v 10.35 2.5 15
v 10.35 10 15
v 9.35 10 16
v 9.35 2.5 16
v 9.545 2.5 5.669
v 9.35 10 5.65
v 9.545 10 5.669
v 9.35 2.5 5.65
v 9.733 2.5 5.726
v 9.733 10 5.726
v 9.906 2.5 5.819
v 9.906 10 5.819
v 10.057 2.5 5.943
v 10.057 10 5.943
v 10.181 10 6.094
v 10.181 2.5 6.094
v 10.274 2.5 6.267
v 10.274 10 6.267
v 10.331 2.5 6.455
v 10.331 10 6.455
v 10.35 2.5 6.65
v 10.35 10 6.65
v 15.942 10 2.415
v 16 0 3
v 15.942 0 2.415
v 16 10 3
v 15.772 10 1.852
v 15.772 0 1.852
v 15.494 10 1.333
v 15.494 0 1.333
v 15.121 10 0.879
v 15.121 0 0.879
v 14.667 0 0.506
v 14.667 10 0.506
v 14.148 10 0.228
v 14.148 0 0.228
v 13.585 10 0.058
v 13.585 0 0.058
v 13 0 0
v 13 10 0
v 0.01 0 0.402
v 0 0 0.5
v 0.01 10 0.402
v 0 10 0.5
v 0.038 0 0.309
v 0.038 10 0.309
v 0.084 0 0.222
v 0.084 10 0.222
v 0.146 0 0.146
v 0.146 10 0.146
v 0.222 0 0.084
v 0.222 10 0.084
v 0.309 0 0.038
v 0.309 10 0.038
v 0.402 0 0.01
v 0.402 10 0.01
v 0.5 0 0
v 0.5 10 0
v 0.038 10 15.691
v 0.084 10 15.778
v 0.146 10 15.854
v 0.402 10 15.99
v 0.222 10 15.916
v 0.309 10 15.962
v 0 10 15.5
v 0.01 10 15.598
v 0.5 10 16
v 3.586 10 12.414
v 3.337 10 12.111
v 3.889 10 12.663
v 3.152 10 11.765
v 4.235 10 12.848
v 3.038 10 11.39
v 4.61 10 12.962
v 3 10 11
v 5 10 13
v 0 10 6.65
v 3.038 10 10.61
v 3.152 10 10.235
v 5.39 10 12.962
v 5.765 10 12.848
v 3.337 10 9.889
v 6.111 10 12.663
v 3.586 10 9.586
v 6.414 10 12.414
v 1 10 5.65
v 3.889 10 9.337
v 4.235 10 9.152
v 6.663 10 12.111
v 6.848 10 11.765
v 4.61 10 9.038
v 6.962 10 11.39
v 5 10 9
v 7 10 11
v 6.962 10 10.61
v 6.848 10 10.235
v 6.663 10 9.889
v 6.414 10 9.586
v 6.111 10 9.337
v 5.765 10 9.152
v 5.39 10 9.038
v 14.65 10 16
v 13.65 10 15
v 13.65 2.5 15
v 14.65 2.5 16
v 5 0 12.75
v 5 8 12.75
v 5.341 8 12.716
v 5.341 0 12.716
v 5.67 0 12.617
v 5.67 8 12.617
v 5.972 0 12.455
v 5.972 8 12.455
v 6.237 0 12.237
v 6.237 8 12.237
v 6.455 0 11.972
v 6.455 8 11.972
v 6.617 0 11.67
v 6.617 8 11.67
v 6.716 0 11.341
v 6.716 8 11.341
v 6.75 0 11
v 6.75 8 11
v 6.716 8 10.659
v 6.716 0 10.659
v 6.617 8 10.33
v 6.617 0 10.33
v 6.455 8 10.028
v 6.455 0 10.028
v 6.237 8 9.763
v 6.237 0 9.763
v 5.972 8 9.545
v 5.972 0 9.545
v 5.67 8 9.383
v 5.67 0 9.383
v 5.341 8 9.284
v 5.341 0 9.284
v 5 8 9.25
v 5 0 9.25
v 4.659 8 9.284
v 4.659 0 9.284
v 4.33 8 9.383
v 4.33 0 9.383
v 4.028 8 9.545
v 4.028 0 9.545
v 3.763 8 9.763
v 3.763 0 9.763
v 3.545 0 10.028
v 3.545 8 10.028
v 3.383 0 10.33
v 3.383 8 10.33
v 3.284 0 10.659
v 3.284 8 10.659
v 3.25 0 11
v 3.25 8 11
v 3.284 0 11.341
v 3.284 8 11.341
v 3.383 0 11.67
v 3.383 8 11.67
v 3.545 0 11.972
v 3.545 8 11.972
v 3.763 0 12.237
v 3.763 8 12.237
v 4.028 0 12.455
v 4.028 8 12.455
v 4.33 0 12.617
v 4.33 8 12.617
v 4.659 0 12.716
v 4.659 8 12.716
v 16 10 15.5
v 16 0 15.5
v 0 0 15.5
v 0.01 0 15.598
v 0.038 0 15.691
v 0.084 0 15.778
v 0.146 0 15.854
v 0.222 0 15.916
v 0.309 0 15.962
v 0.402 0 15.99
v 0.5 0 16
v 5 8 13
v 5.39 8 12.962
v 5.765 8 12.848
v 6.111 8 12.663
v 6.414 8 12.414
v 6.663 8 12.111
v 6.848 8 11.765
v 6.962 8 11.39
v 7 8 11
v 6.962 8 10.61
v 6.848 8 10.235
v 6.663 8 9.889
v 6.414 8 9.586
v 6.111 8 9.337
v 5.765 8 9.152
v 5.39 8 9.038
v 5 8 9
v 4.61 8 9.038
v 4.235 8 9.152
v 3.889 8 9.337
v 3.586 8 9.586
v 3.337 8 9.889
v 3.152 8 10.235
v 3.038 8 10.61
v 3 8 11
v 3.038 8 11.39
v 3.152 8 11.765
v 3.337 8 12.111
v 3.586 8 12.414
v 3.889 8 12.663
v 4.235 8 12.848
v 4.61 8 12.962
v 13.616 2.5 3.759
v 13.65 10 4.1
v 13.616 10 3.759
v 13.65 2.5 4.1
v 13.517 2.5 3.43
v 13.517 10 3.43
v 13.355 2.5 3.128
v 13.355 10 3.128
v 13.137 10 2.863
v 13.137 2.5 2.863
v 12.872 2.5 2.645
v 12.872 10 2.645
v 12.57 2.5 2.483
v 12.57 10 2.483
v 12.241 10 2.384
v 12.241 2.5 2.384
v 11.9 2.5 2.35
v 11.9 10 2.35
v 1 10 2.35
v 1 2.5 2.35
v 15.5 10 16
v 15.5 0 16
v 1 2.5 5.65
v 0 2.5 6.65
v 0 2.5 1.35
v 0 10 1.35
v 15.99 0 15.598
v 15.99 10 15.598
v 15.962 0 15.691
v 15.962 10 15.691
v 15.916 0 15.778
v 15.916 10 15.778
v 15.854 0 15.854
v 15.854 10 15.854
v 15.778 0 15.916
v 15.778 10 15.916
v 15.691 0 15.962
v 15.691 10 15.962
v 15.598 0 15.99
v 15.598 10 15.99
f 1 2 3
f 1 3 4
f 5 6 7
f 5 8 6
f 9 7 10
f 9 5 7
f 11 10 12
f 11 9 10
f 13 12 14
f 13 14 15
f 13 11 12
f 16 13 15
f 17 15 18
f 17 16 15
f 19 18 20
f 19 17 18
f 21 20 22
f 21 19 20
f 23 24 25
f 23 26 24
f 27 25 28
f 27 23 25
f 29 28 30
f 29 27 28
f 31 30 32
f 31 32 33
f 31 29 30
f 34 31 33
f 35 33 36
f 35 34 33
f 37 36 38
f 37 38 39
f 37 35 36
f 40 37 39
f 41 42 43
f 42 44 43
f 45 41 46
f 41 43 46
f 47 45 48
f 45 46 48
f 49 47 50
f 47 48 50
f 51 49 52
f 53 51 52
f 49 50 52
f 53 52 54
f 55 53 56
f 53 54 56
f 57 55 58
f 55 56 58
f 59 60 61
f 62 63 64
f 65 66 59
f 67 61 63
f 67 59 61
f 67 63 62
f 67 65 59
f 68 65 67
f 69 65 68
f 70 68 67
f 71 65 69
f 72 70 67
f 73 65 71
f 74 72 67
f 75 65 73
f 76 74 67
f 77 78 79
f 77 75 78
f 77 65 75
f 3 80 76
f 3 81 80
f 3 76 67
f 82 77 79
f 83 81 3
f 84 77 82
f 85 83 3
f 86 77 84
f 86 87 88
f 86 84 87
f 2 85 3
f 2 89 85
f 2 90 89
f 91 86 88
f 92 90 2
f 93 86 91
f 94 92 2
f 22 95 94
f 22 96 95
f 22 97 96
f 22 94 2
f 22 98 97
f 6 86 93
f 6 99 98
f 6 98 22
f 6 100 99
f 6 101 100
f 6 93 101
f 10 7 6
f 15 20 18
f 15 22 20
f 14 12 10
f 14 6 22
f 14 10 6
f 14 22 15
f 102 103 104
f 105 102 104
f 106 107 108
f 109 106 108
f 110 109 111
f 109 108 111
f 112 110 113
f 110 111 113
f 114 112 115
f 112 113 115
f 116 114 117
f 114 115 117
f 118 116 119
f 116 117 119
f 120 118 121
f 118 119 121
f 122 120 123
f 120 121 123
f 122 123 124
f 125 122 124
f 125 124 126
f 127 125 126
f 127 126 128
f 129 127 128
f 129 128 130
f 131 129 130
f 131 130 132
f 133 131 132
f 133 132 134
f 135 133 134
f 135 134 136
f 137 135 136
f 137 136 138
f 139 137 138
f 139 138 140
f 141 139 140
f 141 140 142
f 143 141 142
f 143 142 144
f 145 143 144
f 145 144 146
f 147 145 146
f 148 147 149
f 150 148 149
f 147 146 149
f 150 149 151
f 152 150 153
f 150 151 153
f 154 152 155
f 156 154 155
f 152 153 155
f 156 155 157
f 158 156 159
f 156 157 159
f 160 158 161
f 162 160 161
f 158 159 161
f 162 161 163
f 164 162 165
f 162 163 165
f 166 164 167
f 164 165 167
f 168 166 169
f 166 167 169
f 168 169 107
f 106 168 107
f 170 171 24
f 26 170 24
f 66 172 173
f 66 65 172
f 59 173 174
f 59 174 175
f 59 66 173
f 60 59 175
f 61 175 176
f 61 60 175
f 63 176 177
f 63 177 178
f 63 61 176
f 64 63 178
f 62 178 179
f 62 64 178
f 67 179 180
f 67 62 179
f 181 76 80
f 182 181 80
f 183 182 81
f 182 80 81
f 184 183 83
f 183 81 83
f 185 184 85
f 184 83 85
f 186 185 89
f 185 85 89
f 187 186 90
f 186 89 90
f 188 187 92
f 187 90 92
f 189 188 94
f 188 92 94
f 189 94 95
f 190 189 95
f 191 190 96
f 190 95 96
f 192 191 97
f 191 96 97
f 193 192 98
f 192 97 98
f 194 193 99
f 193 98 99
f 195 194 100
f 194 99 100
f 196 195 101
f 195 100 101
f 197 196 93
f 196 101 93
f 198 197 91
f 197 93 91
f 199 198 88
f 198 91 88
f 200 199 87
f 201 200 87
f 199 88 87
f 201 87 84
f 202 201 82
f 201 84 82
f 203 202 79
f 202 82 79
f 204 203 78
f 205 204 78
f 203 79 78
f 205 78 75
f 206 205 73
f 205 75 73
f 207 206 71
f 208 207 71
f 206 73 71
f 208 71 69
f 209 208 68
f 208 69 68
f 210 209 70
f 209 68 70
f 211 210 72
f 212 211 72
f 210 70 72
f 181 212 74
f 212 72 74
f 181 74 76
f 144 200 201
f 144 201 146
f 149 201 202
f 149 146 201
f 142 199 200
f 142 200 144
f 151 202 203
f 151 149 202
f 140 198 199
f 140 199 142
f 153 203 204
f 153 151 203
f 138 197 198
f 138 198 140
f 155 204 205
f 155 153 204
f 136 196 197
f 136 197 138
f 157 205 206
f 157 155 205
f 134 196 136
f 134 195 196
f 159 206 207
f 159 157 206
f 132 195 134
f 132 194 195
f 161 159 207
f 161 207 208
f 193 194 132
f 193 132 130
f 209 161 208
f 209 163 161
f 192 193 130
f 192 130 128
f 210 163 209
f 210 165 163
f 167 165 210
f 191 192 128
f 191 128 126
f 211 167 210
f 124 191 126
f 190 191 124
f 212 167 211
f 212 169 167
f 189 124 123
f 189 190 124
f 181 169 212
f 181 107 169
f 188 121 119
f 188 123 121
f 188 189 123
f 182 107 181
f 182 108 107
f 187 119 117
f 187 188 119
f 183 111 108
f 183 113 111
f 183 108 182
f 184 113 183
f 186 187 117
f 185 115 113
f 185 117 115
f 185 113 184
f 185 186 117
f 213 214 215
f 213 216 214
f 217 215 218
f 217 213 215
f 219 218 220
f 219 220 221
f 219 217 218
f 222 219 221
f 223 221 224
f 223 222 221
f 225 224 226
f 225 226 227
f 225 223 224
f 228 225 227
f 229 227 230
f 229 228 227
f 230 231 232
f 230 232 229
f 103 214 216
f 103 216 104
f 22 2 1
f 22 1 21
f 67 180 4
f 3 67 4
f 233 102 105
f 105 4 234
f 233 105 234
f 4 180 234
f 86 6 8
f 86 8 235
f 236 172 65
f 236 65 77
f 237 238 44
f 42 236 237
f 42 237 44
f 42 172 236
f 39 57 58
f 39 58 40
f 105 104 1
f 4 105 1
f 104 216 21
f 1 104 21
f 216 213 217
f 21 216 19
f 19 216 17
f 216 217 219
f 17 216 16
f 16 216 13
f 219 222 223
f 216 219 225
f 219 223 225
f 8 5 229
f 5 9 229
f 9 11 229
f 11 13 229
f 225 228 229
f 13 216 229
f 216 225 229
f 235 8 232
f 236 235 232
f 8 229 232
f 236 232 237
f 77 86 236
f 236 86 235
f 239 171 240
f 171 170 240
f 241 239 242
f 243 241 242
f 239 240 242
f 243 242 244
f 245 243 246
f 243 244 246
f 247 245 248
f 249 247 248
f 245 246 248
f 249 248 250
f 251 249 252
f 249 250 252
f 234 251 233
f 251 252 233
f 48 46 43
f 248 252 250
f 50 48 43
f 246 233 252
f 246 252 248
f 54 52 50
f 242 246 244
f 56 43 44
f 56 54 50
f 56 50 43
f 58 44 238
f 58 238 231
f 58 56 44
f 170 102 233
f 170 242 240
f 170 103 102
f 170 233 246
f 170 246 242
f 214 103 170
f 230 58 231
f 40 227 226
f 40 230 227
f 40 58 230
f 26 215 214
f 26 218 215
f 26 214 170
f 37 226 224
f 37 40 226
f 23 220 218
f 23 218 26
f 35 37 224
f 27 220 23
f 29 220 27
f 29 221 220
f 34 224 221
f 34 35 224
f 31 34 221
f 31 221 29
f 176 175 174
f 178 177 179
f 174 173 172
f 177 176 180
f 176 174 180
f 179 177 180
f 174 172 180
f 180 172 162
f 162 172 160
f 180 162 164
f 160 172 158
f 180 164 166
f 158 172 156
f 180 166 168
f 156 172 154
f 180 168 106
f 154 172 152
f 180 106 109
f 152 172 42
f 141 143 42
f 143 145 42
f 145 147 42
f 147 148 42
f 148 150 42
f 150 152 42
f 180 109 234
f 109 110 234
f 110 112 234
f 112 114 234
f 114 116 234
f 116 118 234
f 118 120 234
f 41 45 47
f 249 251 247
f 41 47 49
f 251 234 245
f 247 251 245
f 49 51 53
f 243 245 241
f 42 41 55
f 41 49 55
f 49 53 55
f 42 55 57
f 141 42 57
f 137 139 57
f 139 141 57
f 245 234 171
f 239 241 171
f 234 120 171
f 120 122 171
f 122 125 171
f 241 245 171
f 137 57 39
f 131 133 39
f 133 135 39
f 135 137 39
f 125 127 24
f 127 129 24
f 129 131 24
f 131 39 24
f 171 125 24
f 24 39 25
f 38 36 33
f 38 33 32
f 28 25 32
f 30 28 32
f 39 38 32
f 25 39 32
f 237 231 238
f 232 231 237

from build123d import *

# Parameters (mm, degrees)
SKETCH1_W           = 16
SKETCH1_H           = 16
BOSS_EXTRUDE1_DEPTH = 10
SKETCH4_R           = 1.75
CUT_EXTRUDE3_DEPTH  = 10
CUT_EXTRUDE4_DEPTH  = 7.5
FILLET1_R           = 1
FILLET2_R           = 1.75
FILLET5_R           = 3
CHAMFER1_SIZE       = 1
FILLET6_R           = 0.5
SKETCH6_R           = 2
CUT_EXTRUDE5_DEPTH  = 2


with BuildPart() as part:
    # Sketch1 → Boss-Extrude1 (new body)
    with BuildSketch(Plane(origin=(0, 0, 0), x_dir=(1, 0, 0), z_dir=(0, 1, 0))):
        with Locations((8, -8)):
            Rectangle(SKETCH1_W, SKETCH1_H)
    extrude(amount=BOSS_EXTRUDE1_DEPTH)

    # Sketch4 → Cut-Extrude3 (cut)
    with BuildSketch(Plane(origin=(0, 10, 0), x_dir=(1, 0, 0), z_dir=(0, 1, 0))):
        with Locations(Location((5, -11, 0), (0, 0, 270))):
            Circle(SKETCH4_R)
    extrude(amount=-CUT_EXTRUDE3_DEPTH, mode=Mode.SUBTRACT)

    # Sketch5 → Cut-Extrude4 (cut)
    with BuildSketch(Plane(origin=(0, 10, 0), x_dir=(1, 0, 0), z_dir=(0, 1, 0))):
        Polygon((0, -2.35), (13.65, -2.35), (13.65, -16), (10.35, -16), (10.35, -5.65), (0, -5.65), align=None)
    extrude(amount=-CUT_EXTRUDE4_DEPTH, mode=Mode.SUBTRACT)

    # Fillet1
    fillet1_edges = [part.edges().sort_by_distance(p)[0] for p in [
        (10.35, 6.25, 5.65),
    ]]
    fillet(fillet1_edges, radius=FILLET1_R)

    # Fillet2
    fillet2_edges = [part.edges().sort_by_distance(p)[0] for p in [
        (13.65, 6.25, 2.35),
    ]]
    fillet(fillet2_edges, radius=FILLET2_R)

    # Fillet5
    fillet5_edges = [part.edges().sort_by_distance(p)[0] for p in [
        (16, 5, 0),
    ]]
    fillet(fillet5_edges, radius=FILLET5_R)

    # Chamfer1
    chamfer1_edges = [part.edges().sort_by_distance(p)[0] for p in [
        (0, 6.25, 5.65),
        (0, 6.25, 2.35),
        (13.65, 6.25, 16),
        (10.35, 6.25, 16),
    ]]
    chamfer(chamfer1_edges, length=CHAMFER1_SIZE)

    # Fillet6
    fillet6_edges = [part.edges().sort_by_distance(p)[0] for p in [
        (0, 5, 0),
        (16, 5, 16),
        (0, 5, 16),
    ]]
    fillet(fillet6_edges, radius=FILLET6_R)

    # Sketch6 → Cut-Extrude5 (cut)
    with BuildSketch(Plane(origin=(0, 10, 0), x_dir=(1, 0, 0), z_dir=(0, 1, 0))):
        with Locations(Location((5, -11, 0), (0, 0, 270))):
            Circle(SKETCH6_R)
    extrude(amount=-CUT_EXTRUDE5_DEPTH, mode=Mode.SUBTRACT)


solid = part.part
